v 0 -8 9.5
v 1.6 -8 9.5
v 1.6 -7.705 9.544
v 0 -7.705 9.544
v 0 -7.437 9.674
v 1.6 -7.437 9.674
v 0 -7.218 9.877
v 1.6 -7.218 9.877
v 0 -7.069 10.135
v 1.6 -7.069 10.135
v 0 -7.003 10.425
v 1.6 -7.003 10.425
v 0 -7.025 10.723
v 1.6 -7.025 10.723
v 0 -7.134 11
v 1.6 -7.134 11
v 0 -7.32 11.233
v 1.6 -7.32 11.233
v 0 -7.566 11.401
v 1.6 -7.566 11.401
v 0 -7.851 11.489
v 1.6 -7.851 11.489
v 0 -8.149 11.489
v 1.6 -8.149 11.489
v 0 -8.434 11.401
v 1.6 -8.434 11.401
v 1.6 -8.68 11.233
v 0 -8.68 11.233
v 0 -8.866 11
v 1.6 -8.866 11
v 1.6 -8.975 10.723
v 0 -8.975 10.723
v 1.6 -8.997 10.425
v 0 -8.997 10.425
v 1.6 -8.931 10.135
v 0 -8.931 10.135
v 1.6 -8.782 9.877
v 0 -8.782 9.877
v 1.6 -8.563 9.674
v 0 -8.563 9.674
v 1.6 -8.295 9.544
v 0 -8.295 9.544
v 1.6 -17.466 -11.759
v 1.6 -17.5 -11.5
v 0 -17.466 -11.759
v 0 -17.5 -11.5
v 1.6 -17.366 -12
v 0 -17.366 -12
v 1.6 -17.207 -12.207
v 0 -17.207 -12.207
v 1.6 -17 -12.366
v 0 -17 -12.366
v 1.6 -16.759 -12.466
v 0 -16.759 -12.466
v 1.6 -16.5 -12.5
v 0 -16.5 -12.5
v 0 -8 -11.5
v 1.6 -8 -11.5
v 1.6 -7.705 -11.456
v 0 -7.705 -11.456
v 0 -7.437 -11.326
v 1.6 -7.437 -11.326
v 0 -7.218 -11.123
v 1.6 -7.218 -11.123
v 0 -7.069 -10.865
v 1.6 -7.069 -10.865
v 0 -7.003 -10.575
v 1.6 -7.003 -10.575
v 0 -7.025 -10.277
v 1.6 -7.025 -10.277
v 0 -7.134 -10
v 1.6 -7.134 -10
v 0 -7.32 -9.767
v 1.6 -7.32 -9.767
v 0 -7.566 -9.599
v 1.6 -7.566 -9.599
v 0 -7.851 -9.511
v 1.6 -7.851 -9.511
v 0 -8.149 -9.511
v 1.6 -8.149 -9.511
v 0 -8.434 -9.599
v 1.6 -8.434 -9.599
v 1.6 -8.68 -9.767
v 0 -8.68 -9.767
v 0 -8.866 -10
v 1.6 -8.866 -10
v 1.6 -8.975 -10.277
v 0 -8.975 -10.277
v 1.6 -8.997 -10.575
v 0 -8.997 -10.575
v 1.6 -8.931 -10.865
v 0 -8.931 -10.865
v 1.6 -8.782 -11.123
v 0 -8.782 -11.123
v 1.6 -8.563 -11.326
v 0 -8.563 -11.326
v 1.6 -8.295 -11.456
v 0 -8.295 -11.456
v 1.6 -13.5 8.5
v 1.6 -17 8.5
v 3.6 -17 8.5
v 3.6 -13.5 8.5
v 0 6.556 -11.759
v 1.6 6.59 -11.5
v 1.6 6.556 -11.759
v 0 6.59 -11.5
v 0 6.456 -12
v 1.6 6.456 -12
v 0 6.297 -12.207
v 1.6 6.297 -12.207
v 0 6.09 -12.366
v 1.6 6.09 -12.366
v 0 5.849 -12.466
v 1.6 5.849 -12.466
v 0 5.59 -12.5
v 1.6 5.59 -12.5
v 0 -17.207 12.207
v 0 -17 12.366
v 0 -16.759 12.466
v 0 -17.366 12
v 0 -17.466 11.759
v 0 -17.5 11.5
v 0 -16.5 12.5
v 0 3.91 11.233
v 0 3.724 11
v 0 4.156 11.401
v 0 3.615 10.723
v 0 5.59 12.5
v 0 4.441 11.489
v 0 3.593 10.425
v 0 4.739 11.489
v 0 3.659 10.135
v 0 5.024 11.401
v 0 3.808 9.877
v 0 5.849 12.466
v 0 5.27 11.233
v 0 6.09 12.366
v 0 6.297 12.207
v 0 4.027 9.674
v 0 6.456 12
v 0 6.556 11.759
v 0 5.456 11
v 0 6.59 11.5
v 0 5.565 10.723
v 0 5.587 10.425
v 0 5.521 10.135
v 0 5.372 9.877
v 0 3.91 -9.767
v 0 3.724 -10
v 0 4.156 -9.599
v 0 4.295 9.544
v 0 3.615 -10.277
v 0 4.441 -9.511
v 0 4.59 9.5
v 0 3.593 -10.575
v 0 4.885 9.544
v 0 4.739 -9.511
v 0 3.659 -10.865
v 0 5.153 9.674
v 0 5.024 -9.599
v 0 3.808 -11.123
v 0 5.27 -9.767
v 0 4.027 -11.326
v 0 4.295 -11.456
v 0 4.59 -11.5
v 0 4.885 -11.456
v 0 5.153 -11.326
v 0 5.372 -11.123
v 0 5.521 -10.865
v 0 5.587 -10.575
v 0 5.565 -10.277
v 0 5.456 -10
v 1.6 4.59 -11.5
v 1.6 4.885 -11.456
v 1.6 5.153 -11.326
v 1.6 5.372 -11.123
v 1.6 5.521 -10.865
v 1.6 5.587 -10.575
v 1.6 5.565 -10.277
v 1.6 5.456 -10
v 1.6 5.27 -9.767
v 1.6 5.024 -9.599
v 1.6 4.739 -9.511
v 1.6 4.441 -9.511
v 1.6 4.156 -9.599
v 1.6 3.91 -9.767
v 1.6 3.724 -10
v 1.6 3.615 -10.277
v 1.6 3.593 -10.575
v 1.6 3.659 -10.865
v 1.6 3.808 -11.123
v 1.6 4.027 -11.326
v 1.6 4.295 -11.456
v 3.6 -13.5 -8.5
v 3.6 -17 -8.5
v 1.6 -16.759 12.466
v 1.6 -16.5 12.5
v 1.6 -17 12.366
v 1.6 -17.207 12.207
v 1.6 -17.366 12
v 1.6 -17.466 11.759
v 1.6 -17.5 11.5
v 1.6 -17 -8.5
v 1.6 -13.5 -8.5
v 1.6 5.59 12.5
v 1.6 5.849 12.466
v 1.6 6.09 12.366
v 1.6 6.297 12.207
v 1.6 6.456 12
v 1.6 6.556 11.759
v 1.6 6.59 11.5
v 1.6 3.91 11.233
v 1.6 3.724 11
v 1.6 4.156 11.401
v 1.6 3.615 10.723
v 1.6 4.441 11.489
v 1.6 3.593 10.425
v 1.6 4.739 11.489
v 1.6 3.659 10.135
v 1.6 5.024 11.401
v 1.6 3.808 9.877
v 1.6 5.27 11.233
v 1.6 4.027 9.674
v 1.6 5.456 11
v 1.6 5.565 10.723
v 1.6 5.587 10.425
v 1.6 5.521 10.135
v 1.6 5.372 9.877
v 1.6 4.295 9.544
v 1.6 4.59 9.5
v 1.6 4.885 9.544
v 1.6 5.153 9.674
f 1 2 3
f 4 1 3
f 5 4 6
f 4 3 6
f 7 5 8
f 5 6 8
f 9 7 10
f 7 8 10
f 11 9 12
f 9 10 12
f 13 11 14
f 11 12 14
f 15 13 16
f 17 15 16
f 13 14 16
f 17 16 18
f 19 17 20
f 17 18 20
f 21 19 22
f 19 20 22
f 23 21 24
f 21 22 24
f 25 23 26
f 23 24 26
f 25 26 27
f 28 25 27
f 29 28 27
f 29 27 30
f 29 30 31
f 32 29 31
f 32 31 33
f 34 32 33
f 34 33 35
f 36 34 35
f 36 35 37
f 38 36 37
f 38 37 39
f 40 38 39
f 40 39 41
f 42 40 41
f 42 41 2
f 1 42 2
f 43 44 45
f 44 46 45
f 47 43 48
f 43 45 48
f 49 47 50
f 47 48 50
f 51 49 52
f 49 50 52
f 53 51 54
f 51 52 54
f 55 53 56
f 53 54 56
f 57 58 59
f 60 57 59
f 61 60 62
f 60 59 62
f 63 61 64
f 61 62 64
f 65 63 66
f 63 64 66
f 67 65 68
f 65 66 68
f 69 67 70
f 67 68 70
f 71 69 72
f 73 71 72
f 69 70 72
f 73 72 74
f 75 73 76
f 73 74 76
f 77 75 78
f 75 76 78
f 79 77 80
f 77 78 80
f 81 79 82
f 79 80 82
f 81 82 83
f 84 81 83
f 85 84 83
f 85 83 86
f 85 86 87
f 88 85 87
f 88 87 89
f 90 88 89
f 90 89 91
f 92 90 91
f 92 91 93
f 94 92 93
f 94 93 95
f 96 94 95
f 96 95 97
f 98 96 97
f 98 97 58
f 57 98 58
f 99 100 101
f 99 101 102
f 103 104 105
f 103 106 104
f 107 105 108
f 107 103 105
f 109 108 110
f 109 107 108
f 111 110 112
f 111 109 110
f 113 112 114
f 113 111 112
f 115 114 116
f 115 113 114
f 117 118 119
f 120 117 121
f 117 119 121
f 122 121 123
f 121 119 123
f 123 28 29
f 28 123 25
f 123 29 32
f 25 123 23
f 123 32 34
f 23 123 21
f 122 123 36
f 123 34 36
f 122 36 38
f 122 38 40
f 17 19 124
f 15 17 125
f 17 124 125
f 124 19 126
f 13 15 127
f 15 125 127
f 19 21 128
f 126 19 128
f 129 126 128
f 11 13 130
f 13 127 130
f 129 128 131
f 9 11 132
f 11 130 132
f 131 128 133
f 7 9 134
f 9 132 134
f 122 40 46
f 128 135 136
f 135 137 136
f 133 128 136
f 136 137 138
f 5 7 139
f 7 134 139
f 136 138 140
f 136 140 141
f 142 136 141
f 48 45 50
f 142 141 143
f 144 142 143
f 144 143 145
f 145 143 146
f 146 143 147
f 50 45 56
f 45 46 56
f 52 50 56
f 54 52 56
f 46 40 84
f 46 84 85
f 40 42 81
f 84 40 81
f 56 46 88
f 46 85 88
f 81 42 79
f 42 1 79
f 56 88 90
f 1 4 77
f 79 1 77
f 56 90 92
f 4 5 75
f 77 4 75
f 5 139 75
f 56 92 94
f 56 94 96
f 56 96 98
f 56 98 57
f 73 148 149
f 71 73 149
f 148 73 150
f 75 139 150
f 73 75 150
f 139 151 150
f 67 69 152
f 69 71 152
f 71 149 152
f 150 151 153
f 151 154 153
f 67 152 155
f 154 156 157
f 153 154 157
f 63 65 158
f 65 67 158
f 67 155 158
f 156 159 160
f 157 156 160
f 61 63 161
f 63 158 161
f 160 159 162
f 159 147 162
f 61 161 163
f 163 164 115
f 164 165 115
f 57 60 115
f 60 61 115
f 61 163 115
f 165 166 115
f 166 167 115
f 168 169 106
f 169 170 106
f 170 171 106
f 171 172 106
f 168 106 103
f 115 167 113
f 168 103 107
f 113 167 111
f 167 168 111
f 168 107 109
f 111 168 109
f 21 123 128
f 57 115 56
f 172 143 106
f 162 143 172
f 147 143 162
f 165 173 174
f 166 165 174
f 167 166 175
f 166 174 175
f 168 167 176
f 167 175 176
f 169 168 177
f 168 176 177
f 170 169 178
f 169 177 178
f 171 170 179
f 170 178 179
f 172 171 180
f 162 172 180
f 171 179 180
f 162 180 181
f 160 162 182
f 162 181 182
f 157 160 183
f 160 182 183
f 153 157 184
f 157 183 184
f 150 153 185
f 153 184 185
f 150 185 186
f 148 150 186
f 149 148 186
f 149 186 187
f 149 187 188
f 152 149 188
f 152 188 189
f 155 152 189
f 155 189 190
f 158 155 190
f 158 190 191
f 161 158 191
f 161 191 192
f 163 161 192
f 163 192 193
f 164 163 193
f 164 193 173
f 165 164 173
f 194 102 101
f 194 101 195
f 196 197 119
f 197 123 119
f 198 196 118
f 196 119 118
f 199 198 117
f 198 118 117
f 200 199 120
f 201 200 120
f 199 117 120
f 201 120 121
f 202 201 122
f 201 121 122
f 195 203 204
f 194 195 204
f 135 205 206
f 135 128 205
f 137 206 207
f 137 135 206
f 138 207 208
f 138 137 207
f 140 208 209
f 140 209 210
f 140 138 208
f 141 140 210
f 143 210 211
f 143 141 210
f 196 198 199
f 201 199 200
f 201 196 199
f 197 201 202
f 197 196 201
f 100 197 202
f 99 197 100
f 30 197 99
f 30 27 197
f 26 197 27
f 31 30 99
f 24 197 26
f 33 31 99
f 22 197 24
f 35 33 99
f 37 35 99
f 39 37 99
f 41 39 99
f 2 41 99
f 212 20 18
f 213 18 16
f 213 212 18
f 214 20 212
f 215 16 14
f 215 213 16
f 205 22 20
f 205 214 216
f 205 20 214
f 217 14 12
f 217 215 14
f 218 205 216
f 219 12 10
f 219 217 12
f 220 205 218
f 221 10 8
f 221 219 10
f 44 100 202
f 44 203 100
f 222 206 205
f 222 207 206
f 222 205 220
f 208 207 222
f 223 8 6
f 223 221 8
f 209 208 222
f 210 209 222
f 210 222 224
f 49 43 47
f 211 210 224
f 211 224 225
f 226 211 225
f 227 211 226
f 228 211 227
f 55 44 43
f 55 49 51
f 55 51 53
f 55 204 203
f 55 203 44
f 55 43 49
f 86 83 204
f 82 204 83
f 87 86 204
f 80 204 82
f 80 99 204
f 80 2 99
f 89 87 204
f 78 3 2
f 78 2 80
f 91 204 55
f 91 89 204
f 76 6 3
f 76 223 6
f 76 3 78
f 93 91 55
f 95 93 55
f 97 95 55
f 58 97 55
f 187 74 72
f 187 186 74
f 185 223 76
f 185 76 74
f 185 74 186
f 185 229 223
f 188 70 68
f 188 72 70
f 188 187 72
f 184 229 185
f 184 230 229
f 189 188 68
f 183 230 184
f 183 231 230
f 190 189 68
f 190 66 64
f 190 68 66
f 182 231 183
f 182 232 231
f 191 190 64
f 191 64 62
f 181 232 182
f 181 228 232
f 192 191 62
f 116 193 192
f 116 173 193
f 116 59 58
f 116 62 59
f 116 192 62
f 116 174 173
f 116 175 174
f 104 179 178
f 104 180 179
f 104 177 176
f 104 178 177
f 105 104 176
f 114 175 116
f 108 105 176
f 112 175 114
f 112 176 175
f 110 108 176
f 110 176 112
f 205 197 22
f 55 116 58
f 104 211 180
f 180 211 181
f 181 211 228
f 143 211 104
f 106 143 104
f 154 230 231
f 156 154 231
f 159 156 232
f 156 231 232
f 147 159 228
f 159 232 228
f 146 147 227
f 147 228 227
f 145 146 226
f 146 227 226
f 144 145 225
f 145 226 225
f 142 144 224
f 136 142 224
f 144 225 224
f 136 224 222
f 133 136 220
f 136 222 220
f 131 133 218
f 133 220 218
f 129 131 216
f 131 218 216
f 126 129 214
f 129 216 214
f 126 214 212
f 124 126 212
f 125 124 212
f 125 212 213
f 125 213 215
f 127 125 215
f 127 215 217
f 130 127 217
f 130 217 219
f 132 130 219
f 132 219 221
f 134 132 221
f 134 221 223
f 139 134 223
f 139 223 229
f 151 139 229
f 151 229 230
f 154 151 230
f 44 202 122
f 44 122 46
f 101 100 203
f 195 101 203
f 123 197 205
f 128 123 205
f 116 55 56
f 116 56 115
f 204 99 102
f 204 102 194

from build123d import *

# Parameters (mm, degrees)
IZIM1_W                     = 25
IZIM1_H                     = 24.09
Y_KSEKLIK_EKSTR_ZYON1_DEPTH = 1.6
IZIM2_W                     = 17
IZIM2_H                     = 3.5
Y_KSEKLIK_EKSTR_ZYON2_DEPTH = 2
RADYUS1_R                   = 1
IZIM5_R                     = 1
KES_EKSTR_ZYON1_DEPTH       = 10


with BuildPart() as part:
    # Çizim1 → Yükseklik-Ekstrüzyon1 (new body)
    with BuildSketch(Plane(origin=(1.6, 0, 0), x_dir=(0, 0, -1), z_dir=(1, 0, 0))):
        with Locations((0, -5.455)):
            Rectangle(IZIM1_W, IZIM1_H)
    extrude(amount=-Y_KSEKLIK_EKSTR_ZYON1_DEPTH)

    # Çizim2 → Yükseklik-Ekstrüzyon2 (add)
    with BuildSketch(Plane(origin=(1.6, 0, 0), x_dir=(0, 0, -1), z_dir=(1, 0, 0))):
        with Locations((0, -15.25)):
            Rectangle(IZIM2_W, IZIM2_H)
    extrude(amount=Y_KSEKLIK_EKSTR_ZYON2_DEPTH)

    # Radyus1
    radyus1_edges = [part.edges().sort_by_distance(p)[0] for p in [
        (0.8, 6.59, -12.5),
        (0.8, -17.5, -12.5),
        (0.8, -17.5, 12.5),
        (0.8, 6.59, 12.5),
    ]]
    fillet(radyus1_edges, radius=RADYUS1_R)

    # Çizim5 → Kes-Ekstrüzyon1 (cut)
    with BuildSketch(Plane(origin=(1.6, 0, 0), x_dir=(0, 0, -1), z_dir=(1, 0, 0))):
        with Locations((10.5, 4.59)):
            Circle(IZIM5_R)
        with Locations((-10.5, 4.59)):
            Circle(IZIM5_R)
        with Locations((-10.5, -8)):
            Circle(IZIM5_R)
        with Locations((10.5, -8)):
            Circle(IZIM5_R)
    extrude(amount=-KES_EKSTR_ZYON1_DEPTH, mode=Mode.SUBTRACT)


solid = part.part
